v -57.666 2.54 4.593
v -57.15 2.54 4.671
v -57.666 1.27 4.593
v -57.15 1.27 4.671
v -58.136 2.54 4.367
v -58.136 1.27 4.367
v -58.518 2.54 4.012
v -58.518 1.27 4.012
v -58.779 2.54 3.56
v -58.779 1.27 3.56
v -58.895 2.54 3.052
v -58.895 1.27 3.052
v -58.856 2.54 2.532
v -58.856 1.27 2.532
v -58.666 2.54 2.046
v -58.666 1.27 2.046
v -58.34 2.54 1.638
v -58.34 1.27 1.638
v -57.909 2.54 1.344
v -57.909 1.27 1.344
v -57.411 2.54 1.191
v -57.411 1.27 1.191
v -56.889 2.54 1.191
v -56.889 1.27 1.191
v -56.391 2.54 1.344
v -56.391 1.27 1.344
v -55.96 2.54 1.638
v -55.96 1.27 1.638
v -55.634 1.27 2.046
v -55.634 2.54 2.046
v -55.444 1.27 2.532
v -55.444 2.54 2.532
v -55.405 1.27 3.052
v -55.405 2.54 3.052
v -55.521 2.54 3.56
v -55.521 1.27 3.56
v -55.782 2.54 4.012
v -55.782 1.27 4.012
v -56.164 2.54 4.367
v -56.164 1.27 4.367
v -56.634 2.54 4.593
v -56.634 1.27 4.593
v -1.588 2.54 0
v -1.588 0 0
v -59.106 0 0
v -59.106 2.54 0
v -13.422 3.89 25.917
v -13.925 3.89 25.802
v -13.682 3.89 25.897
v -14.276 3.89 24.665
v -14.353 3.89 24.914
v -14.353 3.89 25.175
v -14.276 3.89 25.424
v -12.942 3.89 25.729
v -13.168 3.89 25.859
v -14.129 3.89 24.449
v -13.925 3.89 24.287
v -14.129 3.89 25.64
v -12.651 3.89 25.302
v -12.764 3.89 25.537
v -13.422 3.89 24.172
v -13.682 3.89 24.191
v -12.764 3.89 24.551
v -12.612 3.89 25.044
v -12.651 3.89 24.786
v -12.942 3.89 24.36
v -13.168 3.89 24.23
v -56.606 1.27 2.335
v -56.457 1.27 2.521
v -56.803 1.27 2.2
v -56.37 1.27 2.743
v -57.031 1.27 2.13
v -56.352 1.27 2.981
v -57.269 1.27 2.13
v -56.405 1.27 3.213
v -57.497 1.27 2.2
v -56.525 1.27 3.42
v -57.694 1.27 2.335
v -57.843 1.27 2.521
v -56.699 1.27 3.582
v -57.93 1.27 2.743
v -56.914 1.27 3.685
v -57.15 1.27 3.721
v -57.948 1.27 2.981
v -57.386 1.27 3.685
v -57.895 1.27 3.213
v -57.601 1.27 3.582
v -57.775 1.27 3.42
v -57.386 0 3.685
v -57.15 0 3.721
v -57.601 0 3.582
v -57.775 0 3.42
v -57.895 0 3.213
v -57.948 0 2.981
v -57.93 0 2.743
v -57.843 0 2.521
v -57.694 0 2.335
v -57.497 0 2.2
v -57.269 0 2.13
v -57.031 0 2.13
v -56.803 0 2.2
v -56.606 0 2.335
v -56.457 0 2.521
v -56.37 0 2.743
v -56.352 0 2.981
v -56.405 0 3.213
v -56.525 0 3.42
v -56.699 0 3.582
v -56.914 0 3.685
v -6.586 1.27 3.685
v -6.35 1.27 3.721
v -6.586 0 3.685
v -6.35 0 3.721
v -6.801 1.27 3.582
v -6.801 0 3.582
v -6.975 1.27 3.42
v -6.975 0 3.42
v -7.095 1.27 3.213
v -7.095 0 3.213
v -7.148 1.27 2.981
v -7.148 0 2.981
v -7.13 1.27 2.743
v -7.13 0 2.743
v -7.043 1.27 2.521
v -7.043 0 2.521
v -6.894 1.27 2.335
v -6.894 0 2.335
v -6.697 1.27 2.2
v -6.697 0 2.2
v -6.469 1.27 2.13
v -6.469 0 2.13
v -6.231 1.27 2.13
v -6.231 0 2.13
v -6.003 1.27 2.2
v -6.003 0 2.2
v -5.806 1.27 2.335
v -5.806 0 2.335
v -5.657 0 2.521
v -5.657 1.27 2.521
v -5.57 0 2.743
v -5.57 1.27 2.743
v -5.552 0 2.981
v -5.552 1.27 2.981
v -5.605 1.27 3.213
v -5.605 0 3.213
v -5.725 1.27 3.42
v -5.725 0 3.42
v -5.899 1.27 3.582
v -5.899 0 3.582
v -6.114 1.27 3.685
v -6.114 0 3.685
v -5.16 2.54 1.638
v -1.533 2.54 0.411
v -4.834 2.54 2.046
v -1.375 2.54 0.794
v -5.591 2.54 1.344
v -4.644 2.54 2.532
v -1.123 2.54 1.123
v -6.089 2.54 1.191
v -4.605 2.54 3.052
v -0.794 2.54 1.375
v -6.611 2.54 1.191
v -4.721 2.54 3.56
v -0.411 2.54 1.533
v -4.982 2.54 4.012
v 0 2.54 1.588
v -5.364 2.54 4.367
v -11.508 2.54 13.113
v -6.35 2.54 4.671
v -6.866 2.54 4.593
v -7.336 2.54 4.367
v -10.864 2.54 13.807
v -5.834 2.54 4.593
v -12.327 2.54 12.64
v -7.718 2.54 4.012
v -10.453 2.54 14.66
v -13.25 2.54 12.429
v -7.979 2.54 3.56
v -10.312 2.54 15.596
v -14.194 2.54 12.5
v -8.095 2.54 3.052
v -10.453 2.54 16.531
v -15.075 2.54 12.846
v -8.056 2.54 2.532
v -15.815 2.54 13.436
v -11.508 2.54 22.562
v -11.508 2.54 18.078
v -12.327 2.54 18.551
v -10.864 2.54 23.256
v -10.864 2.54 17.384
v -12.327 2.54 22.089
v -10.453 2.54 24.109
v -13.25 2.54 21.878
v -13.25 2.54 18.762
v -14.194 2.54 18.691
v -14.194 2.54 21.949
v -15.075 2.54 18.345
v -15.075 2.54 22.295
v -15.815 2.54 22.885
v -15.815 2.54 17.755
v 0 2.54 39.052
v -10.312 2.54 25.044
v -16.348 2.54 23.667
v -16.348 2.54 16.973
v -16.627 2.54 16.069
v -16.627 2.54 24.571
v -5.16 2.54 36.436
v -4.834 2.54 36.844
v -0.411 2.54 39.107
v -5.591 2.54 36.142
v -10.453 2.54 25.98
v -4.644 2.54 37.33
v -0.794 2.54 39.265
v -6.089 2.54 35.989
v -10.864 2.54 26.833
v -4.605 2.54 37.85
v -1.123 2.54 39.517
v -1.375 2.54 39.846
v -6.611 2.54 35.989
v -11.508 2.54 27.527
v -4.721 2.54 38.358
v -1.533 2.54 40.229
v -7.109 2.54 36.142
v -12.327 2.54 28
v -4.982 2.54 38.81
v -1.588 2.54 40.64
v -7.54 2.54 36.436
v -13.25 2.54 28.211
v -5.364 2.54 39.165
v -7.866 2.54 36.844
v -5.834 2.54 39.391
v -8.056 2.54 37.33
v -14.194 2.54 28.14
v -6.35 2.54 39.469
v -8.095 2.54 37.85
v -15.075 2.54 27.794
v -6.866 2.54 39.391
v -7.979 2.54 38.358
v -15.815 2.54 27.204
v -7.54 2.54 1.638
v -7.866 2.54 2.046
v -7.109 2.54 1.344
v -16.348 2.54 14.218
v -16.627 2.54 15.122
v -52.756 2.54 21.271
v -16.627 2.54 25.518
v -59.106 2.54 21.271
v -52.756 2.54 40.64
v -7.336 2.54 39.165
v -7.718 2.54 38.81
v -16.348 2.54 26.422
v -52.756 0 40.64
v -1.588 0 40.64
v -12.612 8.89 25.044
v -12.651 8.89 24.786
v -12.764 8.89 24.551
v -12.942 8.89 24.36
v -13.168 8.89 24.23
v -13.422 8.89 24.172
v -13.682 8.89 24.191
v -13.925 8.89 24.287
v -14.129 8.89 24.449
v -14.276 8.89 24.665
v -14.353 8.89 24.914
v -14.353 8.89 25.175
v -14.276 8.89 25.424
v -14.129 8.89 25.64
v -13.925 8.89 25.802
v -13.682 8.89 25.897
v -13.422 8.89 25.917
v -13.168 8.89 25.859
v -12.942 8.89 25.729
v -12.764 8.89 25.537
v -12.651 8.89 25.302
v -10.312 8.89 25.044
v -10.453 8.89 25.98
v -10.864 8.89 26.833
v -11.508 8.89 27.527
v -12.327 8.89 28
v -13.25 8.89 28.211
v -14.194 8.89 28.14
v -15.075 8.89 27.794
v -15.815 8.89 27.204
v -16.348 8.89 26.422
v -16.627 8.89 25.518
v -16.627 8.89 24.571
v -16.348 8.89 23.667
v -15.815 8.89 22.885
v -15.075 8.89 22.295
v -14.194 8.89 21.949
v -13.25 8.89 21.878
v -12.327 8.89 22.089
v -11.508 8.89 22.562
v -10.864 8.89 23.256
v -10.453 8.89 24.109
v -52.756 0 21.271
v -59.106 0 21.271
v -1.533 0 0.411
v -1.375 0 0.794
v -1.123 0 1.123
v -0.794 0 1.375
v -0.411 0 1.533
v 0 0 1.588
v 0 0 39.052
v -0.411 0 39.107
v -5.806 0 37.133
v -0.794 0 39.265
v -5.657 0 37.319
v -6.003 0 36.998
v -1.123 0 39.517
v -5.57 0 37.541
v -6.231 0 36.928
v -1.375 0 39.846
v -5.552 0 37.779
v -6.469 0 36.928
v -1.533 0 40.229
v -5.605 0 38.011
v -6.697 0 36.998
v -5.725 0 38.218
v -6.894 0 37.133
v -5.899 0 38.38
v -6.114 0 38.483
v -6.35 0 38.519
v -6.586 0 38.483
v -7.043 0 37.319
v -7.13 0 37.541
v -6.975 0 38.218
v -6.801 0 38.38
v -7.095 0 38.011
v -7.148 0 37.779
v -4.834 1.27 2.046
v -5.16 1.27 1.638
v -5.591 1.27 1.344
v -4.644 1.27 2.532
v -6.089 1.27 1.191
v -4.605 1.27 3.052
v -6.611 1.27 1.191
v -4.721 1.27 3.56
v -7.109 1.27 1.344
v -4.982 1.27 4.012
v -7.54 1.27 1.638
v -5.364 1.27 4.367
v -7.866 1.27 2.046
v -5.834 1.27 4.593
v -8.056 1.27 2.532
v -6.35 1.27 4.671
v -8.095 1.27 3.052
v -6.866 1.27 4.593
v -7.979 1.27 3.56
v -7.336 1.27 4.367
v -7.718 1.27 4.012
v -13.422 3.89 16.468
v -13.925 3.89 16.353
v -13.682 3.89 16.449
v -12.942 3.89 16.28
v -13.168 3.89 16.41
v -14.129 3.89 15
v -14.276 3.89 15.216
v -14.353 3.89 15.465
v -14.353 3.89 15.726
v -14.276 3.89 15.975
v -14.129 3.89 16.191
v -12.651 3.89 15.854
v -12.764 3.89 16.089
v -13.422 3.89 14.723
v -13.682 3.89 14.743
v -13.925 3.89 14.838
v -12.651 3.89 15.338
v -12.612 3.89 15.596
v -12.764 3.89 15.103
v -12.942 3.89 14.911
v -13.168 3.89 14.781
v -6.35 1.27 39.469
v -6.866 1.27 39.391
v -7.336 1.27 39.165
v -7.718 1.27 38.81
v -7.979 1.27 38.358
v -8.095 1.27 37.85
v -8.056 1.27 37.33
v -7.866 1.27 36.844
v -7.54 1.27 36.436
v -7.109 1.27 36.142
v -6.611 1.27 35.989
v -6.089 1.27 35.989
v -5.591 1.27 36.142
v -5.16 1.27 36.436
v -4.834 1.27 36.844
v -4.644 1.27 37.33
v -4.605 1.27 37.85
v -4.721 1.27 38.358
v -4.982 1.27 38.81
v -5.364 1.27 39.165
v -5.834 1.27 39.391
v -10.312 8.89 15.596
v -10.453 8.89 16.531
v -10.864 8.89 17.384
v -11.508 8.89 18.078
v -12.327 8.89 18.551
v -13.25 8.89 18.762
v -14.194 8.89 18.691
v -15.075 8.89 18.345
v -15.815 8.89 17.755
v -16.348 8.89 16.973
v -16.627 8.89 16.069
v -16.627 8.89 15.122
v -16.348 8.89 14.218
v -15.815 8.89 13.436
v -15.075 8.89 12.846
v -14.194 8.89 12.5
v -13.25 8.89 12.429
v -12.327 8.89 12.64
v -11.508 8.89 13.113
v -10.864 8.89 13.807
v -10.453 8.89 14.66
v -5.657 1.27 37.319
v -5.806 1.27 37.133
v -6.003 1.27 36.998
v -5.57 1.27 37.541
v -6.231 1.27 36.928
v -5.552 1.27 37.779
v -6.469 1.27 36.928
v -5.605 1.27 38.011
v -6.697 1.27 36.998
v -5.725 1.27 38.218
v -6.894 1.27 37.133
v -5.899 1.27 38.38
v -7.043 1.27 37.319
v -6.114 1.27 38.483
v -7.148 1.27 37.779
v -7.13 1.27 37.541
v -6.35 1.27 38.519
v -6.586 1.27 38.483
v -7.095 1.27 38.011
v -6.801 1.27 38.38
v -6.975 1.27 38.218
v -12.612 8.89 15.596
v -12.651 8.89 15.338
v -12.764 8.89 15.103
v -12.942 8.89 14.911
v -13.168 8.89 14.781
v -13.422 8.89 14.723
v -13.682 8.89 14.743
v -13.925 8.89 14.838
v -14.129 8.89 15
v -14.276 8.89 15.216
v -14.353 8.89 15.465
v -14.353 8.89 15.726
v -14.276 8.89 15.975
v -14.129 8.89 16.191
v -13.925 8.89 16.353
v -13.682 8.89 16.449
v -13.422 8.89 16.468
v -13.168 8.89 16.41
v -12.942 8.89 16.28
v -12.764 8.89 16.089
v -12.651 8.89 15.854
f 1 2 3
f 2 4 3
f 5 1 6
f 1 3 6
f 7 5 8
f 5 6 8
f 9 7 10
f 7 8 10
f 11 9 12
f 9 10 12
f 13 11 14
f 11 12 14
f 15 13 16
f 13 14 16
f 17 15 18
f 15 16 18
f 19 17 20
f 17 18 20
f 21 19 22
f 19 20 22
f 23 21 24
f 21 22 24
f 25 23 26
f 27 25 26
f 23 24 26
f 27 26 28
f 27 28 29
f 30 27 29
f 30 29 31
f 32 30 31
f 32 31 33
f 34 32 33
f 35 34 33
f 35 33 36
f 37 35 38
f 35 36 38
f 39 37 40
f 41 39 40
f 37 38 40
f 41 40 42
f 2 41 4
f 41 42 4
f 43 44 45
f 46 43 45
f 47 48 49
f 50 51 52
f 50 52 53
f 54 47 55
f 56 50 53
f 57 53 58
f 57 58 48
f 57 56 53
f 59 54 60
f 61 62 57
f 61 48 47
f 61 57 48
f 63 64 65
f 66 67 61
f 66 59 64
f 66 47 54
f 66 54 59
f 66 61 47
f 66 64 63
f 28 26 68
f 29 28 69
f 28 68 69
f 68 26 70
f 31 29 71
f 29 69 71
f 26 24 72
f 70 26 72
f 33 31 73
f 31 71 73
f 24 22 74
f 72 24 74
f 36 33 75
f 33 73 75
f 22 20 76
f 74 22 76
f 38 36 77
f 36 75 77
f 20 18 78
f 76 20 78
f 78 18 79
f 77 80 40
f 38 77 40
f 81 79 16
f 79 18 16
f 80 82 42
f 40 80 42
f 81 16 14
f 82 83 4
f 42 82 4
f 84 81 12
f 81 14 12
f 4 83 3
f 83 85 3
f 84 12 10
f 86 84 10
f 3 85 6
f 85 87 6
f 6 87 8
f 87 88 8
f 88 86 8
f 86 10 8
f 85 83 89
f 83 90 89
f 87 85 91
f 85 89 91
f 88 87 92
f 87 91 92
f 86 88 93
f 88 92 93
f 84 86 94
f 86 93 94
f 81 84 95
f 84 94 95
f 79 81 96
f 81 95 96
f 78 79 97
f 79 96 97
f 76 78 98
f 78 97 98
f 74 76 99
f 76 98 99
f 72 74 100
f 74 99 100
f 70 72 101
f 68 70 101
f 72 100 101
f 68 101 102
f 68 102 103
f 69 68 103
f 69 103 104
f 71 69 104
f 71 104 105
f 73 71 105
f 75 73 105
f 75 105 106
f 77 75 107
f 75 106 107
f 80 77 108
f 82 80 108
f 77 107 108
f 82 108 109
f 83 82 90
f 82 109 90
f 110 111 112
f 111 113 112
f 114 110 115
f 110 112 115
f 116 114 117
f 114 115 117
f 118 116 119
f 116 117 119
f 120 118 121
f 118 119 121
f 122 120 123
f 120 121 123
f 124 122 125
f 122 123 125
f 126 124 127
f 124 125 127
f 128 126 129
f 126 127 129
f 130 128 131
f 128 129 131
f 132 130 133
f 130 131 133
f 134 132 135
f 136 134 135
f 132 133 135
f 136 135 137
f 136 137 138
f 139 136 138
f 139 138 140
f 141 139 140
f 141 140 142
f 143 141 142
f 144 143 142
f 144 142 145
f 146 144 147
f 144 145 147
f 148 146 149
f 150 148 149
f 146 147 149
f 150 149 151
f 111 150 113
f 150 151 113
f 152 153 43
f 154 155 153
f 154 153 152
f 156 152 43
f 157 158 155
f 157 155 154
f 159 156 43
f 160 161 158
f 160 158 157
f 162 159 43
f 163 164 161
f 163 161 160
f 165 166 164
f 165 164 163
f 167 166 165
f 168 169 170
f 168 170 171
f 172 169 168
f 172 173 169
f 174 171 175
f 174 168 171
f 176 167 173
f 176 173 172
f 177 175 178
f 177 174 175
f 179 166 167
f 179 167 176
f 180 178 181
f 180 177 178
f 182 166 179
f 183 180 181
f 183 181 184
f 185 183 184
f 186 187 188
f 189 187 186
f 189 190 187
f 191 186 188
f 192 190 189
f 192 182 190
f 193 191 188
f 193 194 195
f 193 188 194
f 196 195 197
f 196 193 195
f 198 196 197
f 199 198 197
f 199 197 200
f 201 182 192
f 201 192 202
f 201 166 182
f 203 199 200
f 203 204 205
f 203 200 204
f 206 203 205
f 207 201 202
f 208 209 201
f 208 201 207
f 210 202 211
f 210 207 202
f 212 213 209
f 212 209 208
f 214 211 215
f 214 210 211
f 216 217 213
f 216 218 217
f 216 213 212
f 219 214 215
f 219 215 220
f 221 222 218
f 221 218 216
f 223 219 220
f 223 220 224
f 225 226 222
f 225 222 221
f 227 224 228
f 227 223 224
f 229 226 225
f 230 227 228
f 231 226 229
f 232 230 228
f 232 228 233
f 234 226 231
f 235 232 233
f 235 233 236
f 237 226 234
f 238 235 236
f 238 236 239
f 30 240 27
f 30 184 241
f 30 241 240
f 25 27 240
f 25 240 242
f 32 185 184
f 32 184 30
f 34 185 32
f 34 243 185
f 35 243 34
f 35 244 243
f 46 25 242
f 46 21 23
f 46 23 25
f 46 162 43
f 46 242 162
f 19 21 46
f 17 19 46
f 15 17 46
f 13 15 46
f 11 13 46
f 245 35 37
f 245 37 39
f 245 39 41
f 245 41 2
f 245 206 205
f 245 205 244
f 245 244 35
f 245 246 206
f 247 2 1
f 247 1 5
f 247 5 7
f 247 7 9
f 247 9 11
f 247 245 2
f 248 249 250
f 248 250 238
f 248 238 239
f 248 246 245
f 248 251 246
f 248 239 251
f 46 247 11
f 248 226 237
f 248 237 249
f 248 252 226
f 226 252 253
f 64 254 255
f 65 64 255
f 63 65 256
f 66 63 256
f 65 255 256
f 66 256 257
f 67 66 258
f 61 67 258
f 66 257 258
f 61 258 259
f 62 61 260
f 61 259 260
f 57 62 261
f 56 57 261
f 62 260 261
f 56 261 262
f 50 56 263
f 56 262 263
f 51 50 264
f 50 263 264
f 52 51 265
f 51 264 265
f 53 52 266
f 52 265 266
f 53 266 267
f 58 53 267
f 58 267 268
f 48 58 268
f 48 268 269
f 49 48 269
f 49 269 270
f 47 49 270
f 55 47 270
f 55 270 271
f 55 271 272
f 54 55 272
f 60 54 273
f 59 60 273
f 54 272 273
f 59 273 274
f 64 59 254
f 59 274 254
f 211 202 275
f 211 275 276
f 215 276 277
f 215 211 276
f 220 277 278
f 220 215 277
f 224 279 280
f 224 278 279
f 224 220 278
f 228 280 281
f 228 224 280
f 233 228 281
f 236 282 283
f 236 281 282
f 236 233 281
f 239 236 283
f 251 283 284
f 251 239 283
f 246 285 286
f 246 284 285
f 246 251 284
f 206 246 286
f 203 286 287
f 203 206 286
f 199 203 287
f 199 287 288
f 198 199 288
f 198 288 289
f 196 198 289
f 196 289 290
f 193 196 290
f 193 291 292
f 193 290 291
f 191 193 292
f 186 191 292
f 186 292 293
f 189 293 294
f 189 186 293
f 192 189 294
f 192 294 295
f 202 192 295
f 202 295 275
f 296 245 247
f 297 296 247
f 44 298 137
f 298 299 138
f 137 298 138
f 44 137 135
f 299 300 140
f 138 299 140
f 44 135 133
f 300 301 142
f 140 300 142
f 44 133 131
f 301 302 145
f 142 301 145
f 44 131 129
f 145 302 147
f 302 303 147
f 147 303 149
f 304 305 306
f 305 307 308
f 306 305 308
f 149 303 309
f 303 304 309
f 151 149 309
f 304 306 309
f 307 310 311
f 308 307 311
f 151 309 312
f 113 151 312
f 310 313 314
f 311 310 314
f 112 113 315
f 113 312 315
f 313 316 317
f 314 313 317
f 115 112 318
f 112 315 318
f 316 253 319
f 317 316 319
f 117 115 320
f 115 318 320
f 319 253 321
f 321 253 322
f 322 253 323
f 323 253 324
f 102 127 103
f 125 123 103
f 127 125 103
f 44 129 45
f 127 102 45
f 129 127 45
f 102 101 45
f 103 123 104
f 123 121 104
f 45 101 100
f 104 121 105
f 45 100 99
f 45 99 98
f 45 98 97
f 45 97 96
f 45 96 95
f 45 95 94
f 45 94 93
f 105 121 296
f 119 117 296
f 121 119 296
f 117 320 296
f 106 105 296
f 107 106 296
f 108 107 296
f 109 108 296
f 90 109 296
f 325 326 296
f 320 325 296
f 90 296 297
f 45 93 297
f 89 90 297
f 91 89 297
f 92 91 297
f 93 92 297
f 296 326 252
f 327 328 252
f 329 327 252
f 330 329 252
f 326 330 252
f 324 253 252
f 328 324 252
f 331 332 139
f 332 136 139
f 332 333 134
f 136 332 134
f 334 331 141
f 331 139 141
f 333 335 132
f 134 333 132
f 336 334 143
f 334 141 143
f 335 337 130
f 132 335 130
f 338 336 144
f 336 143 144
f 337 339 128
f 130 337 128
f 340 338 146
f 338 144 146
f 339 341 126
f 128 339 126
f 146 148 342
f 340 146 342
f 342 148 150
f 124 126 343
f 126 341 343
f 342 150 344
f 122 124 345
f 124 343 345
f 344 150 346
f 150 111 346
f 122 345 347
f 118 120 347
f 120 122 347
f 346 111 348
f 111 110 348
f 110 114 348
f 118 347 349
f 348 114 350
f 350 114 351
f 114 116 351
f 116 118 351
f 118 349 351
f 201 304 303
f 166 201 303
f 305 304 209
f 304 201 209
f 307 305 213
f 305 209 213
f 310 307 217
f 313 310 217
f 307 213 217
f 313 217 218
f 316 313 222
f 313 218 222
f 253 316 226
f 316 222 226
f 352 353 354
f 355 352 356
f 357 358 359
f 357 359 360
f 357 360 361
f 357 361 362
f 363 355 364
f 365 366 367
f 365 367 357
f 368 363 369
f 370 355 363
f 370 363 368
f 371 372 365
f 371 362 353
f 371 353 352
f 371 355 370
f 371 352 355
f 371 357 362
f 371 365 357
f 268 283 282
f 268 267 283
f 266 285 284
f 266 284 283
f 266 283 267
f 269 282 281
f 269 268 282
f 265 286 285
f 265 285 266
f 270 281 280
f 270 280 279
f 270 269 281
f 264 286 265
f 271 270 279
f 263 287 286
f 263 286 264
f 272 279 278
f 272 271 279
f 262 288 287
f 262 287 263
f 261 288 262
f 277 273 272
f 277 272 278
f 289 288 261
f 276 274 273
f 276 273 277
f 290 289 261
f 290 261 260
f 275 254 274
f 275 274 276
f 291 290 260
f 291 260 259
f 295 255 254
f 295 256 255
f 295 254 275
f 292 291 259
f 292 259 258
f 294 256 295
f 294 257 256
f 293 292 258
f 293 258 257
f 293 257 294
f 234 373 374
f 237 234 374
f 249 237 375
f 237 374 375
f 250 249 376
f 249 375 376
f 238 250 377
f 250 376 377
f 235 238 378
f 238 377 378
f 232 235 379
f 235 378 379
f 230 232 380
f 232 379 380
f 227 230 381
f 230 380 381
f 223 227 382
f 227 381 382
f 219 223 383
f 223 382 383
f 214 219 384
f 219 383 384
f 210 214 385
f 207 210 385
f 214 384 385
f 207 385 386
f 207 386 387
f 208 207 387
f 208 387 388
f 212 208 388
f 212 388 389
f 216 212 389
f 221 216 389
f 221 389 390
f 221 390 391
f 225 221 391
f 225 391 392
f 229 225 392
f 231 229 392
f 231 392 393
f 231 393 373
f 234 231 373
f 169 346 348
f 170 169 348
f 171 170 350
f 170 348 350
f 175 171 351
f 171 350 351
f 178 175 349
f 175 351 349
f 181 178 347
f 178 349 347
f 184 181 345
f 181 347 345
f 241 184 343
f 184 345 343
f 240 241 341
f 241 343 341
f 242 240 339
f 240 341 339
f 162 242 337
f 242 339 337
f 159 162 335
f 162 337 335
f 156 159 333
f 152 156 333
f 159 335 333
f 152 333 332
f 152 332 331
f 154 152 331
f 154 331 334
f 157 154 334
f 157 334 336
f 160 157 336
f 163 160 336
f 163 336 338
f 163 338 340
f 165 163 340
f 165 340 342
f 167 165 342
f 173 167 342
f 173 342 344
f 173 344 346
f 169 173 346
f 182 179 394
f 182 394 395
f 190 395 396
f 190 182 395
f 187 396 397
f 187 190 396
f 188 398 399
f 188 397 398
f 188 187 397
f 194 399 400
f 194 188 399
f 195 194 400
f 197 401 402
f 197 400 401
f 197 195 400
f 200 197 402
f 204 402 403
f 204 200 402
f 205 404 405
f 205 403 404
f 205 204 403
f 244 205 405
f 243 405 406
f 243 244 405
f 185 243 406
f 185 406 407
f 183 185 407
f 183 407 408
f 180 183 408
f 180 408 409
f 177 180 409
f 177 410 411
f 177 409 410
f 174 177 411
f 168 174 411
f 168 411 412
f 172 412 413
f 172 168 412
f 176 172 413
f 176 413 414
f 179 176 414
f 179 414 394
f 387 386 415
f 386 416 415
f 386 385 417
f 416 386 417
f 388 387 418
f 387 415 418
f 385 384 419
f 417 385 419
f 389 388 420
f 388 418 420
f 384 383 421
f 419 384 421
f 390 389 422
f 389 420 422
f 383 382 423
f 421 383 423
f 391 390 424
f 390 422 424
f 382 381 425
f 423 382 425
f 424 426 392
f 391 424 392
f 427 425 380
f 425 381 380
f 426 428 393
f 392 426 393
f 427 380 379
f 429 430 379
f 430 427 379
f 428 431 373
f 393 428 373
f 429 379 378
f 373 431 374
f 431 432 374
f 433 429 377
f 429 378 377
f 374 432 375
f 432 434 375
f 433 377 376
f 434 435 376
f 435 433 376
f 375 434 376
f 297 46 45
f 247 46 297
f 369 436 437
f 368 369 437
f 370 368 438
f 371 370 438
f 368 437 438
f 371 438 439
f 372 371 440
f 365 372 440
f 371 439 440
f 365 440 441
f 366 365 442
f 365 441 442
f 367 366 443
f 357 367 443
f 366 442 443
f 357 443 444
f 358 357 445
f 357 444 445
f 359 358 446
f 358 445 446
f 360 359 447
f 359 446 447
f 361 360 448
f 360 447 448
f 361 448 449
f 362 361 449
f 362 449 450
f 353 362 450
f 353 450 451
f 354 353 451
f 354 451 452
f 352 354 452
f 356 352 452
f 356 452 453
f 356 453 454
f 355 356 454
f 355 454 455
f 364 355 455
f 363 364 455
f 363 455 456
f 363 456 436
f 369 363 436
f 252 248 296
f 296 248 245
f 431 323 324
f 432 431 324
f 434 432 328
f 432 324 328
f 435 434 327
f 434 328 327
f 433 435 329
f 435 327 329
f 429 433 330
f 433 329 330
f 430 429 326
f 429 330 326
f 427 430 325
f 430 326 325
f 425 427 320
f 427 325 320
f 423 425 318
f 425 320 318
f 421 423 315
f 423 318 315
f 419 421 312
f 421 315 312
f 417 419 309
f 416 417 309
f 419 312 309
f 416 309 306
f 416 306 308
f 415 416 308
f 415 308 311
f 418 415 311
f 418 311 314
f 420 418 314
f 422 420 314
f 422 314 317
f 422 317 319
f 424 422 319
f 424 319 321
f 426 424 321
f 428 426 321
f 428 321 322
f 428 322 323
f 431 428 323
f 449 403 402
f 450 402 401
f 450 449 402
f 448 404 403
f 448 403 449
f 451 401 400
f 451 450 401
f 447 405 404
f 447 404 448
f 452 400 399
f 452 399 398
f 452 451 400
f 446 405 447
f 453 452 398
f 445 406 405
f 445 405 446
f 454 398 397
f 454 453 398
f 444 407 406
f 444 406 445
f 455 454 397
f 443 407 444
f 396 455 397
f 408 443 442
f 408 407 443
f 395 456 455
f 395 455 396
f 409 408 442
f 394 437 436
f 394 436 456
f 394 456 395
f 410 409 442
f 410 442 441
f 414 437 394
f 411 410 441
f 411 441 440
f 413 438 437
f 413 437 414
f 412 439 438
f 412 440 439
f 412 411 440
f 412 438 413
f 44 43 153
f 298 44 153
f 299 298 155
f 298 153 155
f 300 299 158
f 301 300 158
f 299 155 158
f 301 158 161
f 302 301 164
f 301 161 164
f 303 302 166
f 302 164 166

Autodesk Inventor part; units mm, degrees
ref_plane "YZ Plane" through (0, 0, 0) normal (1, 0, 0) x (0, 1, 0)
ref_plane "XZ Plane" through (0, 0, 0) normal (0, 1, 0) x (-1, 0, 0)
ref_plane "XY Plane" through (0, 0, 0) normal (0, 0, 1) x (1, 0, 0)
sketch "Sketch1" plane through (0, 0, 0) normal (0, 1, 0) x (-1, 0, 0)
  line L0 (0, 0) -> (71.12, 0)
  line L1 (71.12, 0) -> (71.12, 40.64)
  line L2 (71.12, 40.64) -> (0, 40.64)
  line L3 (0, 40.64) -> (0, 0)
  dimension "d0" = 71.12
  dimension "d1" = 40.64
extrude "Extrusion1" add sketch "Sketch1" along normal blind 2.54
sketch "Sketch8" plane through (0, 2.54, 0) normal (0, 1, 0) x (1, 0, 0)
  line L0 (0, -40.64) -> (0, 0) projected
  circle A0 centre (-6.35, -37.719) radius 0.8
  circle A1 centre (-6.35, -2.921) radius 0.8
  circle A2 centre (-57.15, -2.921) radius 0.8
  circle A3 centre (-57.15, -37.719) radius 0.8
  dimension "d75" = 1.6
  dimension "d76" = 1.6
  dimension "d77" = 1.6
  dimension "d78" = 1.6
  dimension "d79" = 6.35
  dimension "d108" = 50.8
hole "Hole2" at (-57.15, 2.54, 2.921) at (-57.15, 2.54, 37.719) at (-6.35, 2.54, 37.719) at (-6.35, 2.54, 2.921) direction (0, -1, 0) diameter 1.6 end through all counterbore diameter 3.5 counterbore depth 1.27
sketch "Sketch9" plane through (0, 2.54, 0) normal (0, 1, 0) x (1, 0, 0)
  line L0 (0, 0) -> (-71.12, 0) projected
  line L1 (-71.12, 0) -> (-71.12, -40.64) projected
  line L2 (0, -40.64) -> (0, 0) projected
  arc A0 (0, -39.0525) -> (-1.5875, -40.64) centre (0, -40.64) ccw
  arc A1 (-1.5875, 0) -> (0, -1.5875) centre (0, 0) ccw
  arc A2 (-69.5325, -40.64) -> (-71.12, -39.0525) centre (-71.12, -40.64) ccw
  arc A3 (-71.12, -1.5875) -> (-69.5325, 0) centre (-71.12, 0) ccw
  line L3 (-1.5875, 0) -> (0, 0)
  line L4 (0, 0) -> (0, -1.5875)
  line L5 (0, -39.0525) -> (0, -40.64)
  line L6 (0, -40.64) -> (-1.5875, -40.64)
  line L7 (-69.5325, -40.64) -> (-71.12, -40.64)
  line L8 (-71.12, -40.64) -> (-71.12, -39.0525)
  line L9 (-69.5325, 0) -> (-71.12, 0)
  line L10 (-71.12, 0) -> (-71.12, -1.5875)
  point P0 (-69.85, -7.9375)
  dimension "d87" = 1.5875
  dimension "d89" = 1.5875
  dimension "d90" = 1.5875
  dimension "d91" = 1.5875
extrude "Extrusion9" cut sketch "Sketch9" against normal through all
sketch "Sketch10" plane through (0, 2.54, 0) normal (0, 1, 0) x (1, 0, 0)
  circle A0 centre (-13.4874, -15.5956) radius 3.175
  circle A1 centre (-13.4874, -25.0444) radius 3.175
  line L0 (0, -39.0525) -> (0, -1.5875) projected
  line L1 (-1.5875, 0) -> (-69.5325, 0) projected
  dimension "d95" = 6.35
  dimension "d96" = 6.35
  dimension "d122" = 13.4874
  dimension "d123" = 13.4874
  dimension "d125" = 9.4488
  dimension "d126" = 15.5956
extrude "Extrusion10" add sketch "Sketch10" along normal blind 6.35
sketch "Sketch11" plane through (-13.4874, 8.89, 15.5956) normal (0, 1, 0) x (1, 0, 0)
  circle A0 centre (0, 0) radius 3.175 projected
  circle A1 centre (0, -9.4488) radius 3.175 projected
  circle A2 centre (0, 0) radius 0.875
  circle A3 centre (0, -9.4488) radius 0.875
  line L0 (0, -12.6238) -> (17.5736, -12.6238)
  point P0 (13.4874, 15.5956)
  dimension "d106" = 1.75
  dimension "d107" = 1.75
sketch "Sketch12" plane through (0, 2.54, 0) normal (0, 1, 0) x (1, 0, 0)
  line L0 (-71.12, -1.5875) -> (-71.12, -39.0525) projected
  line L1 (-71.12, 2.2213) -> (-59.1056, 2.2213)
  line L2 (-59.1056, -41.9087) -> (-71.12, -41.9087)
  line L3 (-71.12, -41.9087) -> (-71.12, 2.2213)
  line L4 (0, -39.0525) -> (0, -1.5875) projected
  line L5 (-59.1056, -41.9087) -> (-52.7556, -41.9087)
  line L6 (-52.7556, -41.9087) -> (-52.7556, -21.2712)
  line L7 (-52.7556, -21.2712) -> (-59.1056, -21.2712)
  line L8 (-59.1056, 2.2213) -> (-59.1056, -21.2712)
  dimension "d128" = 20.6375
  dimension "d129" = 6.35
extrude "Extrusion11" cut sketch "Sketch12" against normal blind 25.4
extrude "Extrusion12" cut sketch "Sketch11" against normal blind 5 contours A2 | A3
properties part number "CustomBox_ardplate"
